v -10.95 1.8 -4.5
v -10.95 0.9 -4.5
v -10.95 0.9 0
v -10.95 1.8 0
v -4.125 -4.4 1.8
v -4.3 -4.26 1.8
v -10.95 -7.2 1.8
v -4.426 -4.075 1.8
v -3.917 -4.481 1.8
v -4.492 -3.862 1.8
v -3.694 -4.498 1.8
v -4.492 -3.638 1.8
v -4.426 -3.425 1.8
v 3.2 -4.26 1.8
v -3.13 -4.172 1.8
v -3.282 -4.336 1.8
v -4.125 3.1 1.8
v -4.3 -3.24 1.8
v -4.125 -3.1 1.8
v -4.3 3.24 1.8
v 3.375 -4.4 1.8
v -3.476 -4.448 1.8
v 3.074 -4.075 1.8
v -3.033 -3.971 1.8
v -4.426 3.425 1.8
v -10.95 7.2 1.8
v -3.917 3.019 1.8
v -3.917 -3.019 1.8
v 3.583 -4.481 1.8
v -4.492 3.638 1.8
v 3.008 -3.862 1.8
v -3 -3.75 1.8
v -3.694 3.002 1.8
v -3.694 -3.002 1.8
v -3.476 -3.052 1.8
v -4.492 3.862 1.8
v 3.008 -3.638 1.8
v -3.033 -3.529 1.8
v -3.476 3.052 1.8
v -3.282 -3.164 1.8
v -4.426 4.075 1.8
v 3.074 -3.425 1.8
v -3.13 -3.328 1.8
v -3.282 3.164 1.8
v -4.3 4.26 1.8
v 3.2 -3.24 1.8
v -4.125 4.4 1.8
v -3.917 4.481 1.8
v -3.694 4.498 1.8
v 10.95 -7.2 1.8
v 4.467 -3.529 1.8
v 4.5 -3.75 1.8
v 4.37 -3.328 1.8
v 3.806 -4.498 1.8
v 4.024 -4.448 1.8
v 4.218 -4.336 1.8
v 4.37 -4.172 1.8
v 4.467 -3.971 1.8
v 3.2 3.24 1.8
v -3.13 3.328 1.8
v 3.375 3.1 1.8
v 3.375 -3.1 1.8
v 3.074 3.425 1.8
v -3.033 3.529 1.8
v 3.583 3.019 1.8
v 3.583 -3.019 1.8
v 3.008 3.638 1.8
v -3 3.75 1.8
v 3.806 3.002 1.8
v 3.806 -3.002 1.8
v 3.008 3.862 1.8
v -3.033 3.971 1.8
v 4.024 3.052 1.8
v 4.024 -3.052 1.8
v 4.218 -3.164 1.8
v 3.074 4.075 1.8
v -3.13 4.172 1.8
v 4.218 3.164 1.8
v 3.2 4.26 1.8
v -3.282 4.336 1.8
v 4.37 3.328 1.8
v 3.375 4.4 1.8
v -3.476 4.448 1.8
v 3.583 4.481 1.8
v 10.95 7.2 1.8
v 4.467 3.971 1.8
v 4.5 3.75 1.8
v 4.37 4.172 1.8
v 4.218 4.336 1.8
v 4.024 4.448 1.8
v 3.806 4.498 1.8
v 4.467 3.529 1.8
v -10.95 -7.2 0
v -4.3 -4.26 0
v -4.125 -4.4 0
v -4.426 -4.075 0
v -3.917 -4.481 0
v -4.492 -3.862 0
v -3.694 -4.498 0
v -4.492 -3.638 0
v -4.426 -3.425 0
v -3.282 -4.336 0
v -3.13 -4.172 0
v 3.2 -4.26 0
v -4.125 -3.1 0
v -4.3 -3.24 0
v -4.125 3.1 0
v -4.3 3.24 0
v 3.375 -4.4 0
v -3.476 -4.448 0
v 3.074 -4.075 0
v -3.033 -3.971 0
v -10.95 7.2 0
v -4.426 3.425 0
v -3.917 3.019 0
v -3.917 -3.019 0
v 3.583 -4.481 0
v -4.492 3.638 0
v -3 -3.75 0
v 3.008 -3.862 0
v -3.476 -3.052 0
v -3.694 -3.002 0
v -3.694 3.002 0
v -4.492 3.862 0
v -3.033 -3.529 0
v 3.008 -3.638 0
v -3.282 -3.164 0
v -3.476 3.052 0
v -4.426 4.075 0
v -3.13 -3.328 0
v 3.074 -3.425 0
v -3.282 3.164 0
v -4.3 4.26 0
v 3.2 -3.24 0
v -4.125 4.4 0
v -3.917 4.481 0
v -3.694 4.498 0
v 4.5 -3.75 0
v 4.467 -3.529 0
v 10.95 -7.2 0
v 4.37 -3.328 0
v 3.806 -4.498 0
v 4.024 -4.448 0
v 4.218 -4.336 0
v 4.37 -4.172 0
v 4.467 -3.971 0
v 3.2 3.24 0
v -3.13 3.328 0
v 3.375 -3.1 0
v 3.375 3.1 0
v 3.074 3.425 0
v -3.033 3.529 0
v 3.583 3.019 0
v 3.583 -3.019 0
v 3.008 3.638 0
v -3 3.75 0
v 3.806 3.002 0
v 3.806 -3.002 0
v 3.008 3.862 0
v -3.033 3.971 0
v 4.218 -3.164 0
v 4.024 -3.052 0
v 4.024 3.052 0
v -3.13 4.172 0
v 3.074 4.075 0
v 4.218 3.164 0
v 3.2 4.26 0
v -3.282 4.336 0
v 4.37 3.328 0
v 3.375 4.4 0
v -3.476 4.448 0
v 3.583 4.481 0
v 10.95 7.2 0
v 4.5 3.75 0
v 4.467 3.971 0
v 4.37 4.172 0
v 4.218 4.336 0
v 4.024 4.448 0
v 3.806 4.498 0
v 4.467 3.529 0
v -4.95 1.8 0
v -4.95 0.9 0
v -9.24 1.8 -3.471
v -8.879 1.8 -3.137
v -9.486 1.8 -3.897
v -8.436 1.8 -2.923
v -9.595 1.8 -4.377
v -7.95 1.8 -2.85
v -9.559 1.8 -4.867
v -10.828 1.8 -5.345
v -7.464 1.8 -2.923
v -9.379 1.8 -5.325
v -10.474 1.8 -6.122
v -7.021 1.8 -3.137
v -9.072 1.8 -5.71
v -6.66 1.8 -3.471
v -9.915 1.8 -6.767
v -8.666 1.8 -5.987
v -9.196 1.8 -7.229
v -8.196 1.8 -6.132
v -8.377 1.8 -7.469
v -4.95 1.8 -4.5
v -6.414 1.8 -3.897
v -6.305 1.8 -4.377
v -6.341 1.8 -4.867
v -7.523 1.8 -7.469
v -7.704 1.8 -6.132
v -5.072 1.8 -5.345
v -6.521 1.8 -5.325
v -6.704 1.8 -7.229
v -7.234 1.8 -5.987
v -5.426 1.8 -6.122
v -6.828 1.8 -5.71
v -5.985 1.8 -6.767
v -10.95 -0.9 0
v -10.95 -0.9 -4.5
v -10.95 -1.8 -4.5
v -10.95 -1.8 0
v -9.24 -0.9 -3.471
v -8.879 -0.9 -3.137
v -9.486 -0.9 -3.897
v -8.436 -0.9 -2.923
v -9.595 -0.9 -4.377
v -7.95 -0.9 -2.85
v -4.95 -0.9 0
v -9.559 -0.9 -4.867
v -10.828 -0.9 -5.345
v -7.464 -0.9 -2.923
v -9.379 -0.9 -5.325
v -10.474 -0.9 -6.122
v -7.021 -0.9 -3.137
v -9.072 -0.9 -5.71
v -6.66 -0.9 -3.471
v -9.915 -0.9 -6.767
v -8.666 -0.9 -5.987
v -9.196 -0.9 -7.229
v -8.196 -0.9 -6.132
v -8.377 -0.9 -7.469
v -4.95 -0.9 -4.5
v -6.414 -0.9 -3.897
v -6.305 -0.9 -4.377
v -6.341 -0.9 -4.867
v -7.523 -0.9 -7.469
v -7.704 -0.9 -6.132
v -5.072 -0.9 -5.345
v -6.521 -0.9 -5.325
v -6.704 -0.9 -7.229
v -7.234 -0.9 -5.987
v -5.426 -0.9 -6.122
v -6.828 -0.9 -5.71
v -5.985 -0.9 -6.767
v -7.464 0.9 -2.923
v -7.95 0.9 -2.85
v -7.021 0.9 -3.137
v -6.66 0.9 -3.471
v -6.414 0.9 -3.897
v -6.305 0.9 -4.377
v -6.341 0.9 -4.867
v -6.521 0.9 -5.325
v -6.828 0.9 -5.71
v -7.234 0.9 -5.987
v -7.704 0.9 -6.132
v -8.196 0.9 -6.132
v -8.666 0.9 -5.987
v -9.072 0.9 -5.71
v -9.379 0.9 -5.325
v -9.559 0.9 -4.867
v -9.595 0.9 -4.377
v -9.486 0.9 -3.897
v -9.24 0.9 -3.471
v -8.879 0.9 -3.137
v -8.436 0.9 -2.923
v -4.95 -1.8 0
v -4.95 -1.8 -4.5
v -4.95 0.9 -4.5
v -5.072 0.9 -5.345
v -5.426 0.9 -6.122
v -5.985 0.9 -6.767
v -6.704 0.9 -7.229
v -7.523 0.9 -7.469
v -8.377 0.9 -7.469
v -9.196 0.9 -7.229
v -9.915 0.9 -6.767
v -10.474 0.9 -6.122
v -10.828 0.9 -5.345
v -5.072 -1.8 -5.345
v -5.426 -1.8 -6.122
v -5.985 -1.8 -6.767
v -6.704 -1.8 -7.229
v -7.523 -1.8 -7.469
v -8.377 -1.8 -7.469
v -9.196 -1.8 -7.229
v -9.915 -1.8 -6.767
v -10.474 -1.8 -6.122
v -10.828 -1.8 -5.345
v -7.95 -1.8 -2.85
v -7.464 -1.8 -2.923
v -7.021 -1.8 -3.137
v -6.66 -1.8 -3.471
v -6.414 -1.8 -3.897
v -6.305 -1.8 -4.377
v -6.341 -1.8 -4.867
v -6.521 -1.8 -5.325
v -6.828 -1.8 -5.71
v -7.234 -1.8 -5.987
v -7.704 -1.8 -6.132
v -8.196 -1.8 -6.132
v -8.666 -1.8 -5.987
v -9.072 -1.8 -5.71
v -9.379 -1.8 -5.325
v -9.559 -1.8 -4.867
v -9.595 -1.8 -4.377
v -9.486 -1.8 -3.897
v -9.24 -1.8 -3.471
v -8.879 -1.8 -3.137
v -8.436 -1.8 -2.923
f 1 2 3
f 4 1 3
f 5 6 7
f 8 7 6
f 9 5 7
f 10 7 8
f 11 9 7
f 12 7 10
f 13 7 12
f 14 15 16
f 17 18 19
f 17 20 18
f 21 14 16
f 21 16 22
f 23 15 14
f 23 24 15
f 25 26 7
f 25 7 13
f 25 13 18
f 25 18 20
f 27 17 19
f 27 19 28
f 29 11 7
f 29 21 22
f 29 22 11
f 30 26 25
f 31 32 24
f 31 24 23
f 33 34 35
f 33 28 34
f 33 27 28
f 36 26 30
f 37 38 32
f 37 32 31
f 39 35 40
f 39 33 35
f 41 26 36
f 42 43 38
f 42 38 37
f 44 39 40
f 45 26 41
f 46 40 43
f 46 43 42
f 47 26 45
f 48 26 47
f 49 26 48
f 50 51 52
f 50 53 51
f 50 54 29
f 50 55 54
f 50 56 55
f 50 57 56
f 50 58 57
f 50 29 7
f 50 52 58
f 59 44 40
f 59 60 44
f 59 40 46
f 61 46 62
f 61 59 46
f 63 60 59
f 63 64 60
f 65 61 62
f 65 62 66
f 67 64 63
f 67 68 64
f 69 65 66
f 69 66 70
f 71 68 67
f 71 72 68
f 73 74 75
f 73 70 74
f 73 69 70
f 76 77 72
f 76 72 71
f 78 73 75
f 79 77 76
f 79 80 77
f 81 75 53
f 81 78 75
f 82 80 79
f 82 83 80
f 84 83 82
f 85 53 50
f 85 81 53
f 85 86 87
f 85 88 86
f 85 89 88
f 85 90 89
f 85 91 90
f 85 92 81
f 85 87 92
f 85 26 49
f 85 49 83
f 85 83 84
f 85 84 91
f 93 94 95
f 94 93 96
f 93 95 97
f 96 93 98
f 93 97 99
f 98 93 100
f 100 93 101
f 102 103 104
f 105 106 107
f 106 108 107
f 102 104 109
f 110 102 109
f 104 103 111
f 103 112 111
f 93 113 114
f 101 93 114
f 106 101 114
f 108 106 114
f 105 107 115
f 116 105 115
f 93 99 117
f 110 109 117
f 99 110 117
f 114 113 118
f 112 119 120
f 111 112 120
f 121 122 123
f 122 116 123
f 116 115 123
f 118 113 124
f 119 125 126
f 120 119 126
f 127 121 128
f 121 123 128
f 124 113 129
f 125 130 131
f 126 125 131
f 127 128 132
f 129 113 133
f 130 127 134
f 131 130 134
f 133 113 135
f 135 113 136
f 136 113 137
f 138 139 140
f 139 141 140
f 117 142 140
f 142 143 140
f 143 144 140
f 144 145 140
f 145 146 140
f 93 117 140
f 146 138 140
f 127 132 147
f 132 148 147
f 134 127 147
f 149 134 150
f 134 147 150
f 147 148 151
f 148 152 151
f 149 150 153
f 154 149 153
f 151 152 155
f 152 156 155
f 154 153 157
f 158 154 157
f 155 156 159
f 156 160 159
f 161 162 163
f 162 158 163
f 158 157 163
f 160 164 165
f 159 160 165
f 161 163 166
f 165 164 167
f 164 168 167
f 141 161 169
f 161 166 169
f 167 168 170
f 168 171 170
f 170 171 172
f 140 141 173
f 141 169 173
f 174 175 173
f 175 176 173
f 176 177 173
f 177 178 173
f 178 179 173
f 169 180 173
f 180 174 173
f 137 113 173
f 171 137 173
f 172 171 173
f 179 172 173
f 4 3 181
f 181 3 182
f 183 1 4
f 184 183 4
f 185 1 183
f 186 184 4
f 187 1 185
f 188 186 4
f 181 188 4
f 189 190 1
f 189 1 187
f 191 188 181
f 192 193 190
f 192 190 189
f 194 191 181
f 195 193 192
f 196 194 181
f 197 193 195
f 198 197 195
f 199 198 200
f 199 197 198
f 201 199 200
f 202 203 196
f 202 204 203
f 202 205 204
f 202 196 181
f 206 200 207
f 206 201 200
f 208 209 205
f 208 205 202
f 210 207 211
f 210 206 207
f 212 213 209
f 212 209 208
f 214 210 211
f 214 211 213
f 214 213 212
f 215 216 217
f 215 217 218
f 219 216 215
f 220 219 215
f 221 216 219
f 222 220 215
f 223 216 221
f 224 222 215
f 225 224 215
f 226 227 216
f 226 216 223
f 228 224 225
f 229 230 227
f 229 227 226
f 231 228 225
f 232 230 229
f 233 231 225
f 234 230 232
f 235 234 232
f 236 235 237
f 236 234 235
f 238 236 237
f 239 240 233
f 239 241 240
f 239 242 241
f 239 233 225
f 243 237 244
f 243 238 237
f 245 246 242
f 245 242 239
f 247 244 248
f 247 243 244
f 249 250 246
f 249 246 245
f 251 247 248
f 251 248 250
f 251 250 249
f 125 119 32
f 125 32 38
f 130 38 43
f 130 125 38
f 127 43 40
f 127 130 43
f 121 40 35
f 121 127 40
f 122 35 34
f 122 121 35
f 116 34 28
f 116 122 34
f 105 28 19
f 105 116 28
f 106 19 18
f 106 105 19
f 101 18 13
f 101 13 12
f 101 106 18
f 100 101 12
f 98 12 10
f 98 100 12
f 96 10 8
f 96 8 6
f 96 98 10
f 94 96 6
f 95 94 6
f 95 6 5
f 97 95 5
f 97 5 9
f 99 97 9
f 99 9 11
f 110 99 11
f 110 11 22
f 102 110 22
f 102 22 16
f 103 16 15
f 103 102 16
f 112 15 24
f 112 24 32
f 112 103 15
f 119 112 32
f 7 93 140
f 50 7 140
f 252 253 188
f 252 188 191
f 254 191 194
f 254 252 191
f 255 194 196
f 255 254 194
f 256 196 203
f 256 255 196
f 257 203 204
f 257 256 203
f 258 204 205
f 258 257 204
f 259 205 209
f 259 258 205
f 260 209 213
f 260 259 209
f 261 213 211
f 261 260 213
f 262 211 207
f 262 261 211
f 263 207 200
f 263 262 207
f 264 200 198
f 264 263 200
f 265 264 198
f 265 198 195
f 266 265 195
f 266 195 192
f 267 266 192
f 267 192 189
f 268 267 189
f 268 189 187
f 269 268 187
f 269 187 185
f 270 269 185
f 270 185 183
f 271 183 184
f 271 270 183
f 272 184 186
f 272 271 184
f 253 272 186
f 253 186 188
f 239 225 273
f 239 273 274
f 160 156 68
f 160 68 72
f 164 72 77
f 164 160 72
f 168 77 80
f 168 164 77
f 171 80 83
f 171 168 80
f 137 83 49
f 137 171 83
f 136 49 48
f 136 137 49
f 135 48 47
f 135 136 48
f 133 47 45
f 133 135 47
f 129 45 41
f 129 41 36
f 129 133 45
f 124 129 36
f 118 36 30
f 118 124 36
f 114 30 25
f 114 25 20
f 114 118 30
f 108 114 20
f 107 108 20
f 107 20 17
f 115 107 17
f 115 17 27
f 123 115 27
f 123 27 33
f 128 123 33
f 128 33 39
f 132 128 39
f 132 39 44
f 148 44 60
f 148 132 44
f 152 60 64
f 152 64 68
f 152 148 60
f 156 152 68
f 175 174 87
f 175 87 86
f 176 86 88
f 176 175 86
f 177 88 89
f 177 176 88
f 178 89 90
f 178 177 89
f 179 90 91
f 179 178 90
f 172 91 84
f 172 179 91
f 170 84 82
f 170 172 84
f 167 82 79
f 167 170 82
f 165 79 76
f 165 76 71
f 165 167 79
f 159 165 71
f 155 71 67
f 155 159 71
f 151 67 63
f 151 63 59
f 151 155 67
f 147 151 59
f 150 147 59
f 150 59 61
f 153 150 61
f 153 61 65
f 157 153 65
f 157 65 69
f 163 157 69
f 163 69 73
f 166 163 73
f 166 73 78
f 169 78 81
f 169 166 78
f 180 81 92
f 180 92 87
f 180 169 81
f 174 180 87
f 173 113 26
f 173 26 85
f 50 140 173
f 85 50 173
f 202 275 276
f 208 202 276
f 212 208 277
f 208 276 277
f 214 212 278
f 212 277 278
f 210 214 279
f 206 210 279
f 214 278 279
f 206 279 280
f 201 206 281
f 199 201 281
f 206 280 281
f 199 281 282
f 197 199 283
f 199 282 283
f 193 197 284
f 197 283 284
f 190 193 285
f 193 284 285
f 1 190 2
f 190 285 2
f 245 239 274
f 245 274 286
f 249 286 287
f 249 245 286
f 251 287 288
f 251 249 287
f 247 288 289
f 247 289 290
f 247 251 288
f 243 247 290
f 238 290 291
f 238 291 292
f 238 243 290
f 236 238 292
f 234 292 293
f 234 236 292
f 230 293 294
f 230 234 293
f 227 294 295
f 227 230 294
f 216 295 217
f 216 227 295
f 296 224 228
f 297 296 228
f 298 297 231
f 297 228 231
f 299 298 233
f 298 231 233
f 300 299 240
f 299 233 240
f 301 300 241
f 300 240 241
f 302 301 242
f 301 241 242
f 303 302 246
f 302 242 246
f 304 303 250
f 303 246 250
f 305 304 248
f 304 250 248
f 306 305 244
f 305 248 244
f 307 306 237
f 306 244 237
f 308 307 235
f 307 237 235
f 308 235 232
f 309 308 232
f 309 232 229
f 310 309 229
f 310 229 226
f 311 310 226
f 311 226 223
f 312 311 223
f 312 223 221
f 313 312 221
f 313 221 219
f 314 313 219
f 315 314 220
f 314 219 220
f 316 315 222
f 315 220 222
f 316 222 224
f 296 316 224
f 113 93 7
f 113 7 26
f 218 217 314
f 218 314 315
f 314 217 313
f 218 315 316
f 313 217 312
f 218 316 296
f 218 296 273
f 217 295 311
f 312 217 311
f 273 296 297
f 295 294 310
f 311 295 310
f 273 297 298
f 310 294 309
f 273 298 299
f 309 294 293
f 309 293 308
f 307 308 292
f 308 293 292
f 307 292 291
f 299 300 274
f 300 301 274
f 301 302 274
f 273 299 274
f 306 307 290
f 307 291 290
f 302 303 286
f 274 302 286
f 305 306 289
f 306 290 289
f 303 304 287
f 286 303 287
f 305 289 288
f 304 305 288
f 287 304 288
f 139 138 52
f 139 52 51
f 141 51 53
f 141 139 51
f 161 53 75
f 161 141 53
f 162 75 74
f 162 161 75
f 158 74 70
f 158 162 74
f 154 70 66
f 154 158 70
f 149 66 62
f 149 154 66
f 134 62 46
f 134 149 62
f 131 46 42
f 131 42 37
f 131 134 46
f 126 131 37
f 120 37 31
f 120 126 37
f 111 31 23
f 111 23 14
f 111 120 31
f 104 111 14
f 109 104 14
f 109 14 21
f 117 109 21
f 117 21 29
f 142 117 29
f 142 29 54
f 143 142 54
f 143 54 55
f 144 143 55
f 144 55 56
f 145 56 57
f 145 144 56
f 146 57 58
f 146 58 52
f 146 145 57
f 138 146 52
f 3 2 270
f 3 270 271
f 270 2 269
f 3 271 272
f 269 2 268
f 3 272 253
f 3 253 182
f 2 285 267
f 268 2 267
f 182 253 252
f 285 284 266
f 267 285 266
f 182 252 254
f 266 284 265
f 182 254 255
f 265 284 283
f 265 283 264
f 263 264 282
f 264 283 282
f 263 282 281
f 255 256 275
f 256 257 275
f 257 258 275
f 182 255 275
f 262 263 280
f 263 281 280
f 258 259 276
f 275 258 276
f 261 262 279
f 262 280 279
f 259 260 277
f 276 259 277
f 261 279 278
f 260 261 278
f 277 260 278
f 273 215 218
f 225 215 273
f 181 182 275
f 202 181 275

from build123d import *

# Parameters (mm, degrees)
SKETCH_1_W      = 73
SKETCH_1_H      = 48
SKETCH_1_R      = 2.5
EXTRUDE_1_DEPTH = 6
EXTRUDE_START   = 3
SKETCH_3_R      = 5.5
EXTRUDE_2_DEPTH = 3
SCALE_1_SCALE   = 0.3


with BuildPart() as part:
    # 草图1 → 凸台-拉伸1 (new body)
    with BuildSketch(Plane.XY):
        Rectangle(SKETCH_1_W, SKETCH_1_H)
        with Locations((-12.5, 12.5)):
            Circle(SKETCH_1_R, mode=Mode.SUBTRACT)
        with Locations((12.5, 12.5)):
            Circle(SKETCH_1_R, mode=Mode.SUBTRACT)
        with Locations((12.5, -12.5)):
            Circle(SKETCH_1_R, mode=Mode.SUBTRACT)
        with Locations((-12.5, -12.5)):
            Circle(SKETCH_1_R, mode=Mode.SUBTRACT)
    extrude(amount=EXTRUDE_1_DEPTH)


with BuildPart() as body_2:
    # 草图3 → 凸台-拉伸2 (new body)
    with BuildSketch(Plane(origin=(0, 0, 0), x_dir=(1, 0, 0), z_dir=(0, 1, 0)).offset(EXTRUDE_START)):
        with BuildLine():
            Line((-36.5, 0), (-16.5, 0))
            Line((-16.5, 0), (-16.5, 15))
            ThreePointArc((-16.5, 15), (-26.5, 25), (-36.5, 15))
            Line((-36.5, 15), (-36.5, 0))
        make_face()
        with Locations(Location((-26.5, 15, 0), (0, 0, 270))):
            Circle(SKETCH_3_R, mode=Mode.SUBTRACT)
    extrude(amount=EXTRUDE_2_DEPTH)


with BuildPart() as body_3:
    # 镜向1: mirrored copy
    add(body_2.part.mirror(Plane.ZX))


with BuildPart() as body_3_1:
    # 缩放比例1: scaled about (0, 0, 0)
    add(body_3.part.scale(SCALE_1_SCALE))


with BuildPart() as body_2_1:
    # 缩放比例1: scaled about (0, 0, 0)
    add(body_2.part.scale(SCALE_1_SCALE))


with BuildPart() as part_1:
    # 缩放比例1: scaled about (0, 0, 0)
    add(part.part.scale(SCALE_1_SCALE))


solid = Compound([body_3_1.part, body_2_1.part, part_1.part])
